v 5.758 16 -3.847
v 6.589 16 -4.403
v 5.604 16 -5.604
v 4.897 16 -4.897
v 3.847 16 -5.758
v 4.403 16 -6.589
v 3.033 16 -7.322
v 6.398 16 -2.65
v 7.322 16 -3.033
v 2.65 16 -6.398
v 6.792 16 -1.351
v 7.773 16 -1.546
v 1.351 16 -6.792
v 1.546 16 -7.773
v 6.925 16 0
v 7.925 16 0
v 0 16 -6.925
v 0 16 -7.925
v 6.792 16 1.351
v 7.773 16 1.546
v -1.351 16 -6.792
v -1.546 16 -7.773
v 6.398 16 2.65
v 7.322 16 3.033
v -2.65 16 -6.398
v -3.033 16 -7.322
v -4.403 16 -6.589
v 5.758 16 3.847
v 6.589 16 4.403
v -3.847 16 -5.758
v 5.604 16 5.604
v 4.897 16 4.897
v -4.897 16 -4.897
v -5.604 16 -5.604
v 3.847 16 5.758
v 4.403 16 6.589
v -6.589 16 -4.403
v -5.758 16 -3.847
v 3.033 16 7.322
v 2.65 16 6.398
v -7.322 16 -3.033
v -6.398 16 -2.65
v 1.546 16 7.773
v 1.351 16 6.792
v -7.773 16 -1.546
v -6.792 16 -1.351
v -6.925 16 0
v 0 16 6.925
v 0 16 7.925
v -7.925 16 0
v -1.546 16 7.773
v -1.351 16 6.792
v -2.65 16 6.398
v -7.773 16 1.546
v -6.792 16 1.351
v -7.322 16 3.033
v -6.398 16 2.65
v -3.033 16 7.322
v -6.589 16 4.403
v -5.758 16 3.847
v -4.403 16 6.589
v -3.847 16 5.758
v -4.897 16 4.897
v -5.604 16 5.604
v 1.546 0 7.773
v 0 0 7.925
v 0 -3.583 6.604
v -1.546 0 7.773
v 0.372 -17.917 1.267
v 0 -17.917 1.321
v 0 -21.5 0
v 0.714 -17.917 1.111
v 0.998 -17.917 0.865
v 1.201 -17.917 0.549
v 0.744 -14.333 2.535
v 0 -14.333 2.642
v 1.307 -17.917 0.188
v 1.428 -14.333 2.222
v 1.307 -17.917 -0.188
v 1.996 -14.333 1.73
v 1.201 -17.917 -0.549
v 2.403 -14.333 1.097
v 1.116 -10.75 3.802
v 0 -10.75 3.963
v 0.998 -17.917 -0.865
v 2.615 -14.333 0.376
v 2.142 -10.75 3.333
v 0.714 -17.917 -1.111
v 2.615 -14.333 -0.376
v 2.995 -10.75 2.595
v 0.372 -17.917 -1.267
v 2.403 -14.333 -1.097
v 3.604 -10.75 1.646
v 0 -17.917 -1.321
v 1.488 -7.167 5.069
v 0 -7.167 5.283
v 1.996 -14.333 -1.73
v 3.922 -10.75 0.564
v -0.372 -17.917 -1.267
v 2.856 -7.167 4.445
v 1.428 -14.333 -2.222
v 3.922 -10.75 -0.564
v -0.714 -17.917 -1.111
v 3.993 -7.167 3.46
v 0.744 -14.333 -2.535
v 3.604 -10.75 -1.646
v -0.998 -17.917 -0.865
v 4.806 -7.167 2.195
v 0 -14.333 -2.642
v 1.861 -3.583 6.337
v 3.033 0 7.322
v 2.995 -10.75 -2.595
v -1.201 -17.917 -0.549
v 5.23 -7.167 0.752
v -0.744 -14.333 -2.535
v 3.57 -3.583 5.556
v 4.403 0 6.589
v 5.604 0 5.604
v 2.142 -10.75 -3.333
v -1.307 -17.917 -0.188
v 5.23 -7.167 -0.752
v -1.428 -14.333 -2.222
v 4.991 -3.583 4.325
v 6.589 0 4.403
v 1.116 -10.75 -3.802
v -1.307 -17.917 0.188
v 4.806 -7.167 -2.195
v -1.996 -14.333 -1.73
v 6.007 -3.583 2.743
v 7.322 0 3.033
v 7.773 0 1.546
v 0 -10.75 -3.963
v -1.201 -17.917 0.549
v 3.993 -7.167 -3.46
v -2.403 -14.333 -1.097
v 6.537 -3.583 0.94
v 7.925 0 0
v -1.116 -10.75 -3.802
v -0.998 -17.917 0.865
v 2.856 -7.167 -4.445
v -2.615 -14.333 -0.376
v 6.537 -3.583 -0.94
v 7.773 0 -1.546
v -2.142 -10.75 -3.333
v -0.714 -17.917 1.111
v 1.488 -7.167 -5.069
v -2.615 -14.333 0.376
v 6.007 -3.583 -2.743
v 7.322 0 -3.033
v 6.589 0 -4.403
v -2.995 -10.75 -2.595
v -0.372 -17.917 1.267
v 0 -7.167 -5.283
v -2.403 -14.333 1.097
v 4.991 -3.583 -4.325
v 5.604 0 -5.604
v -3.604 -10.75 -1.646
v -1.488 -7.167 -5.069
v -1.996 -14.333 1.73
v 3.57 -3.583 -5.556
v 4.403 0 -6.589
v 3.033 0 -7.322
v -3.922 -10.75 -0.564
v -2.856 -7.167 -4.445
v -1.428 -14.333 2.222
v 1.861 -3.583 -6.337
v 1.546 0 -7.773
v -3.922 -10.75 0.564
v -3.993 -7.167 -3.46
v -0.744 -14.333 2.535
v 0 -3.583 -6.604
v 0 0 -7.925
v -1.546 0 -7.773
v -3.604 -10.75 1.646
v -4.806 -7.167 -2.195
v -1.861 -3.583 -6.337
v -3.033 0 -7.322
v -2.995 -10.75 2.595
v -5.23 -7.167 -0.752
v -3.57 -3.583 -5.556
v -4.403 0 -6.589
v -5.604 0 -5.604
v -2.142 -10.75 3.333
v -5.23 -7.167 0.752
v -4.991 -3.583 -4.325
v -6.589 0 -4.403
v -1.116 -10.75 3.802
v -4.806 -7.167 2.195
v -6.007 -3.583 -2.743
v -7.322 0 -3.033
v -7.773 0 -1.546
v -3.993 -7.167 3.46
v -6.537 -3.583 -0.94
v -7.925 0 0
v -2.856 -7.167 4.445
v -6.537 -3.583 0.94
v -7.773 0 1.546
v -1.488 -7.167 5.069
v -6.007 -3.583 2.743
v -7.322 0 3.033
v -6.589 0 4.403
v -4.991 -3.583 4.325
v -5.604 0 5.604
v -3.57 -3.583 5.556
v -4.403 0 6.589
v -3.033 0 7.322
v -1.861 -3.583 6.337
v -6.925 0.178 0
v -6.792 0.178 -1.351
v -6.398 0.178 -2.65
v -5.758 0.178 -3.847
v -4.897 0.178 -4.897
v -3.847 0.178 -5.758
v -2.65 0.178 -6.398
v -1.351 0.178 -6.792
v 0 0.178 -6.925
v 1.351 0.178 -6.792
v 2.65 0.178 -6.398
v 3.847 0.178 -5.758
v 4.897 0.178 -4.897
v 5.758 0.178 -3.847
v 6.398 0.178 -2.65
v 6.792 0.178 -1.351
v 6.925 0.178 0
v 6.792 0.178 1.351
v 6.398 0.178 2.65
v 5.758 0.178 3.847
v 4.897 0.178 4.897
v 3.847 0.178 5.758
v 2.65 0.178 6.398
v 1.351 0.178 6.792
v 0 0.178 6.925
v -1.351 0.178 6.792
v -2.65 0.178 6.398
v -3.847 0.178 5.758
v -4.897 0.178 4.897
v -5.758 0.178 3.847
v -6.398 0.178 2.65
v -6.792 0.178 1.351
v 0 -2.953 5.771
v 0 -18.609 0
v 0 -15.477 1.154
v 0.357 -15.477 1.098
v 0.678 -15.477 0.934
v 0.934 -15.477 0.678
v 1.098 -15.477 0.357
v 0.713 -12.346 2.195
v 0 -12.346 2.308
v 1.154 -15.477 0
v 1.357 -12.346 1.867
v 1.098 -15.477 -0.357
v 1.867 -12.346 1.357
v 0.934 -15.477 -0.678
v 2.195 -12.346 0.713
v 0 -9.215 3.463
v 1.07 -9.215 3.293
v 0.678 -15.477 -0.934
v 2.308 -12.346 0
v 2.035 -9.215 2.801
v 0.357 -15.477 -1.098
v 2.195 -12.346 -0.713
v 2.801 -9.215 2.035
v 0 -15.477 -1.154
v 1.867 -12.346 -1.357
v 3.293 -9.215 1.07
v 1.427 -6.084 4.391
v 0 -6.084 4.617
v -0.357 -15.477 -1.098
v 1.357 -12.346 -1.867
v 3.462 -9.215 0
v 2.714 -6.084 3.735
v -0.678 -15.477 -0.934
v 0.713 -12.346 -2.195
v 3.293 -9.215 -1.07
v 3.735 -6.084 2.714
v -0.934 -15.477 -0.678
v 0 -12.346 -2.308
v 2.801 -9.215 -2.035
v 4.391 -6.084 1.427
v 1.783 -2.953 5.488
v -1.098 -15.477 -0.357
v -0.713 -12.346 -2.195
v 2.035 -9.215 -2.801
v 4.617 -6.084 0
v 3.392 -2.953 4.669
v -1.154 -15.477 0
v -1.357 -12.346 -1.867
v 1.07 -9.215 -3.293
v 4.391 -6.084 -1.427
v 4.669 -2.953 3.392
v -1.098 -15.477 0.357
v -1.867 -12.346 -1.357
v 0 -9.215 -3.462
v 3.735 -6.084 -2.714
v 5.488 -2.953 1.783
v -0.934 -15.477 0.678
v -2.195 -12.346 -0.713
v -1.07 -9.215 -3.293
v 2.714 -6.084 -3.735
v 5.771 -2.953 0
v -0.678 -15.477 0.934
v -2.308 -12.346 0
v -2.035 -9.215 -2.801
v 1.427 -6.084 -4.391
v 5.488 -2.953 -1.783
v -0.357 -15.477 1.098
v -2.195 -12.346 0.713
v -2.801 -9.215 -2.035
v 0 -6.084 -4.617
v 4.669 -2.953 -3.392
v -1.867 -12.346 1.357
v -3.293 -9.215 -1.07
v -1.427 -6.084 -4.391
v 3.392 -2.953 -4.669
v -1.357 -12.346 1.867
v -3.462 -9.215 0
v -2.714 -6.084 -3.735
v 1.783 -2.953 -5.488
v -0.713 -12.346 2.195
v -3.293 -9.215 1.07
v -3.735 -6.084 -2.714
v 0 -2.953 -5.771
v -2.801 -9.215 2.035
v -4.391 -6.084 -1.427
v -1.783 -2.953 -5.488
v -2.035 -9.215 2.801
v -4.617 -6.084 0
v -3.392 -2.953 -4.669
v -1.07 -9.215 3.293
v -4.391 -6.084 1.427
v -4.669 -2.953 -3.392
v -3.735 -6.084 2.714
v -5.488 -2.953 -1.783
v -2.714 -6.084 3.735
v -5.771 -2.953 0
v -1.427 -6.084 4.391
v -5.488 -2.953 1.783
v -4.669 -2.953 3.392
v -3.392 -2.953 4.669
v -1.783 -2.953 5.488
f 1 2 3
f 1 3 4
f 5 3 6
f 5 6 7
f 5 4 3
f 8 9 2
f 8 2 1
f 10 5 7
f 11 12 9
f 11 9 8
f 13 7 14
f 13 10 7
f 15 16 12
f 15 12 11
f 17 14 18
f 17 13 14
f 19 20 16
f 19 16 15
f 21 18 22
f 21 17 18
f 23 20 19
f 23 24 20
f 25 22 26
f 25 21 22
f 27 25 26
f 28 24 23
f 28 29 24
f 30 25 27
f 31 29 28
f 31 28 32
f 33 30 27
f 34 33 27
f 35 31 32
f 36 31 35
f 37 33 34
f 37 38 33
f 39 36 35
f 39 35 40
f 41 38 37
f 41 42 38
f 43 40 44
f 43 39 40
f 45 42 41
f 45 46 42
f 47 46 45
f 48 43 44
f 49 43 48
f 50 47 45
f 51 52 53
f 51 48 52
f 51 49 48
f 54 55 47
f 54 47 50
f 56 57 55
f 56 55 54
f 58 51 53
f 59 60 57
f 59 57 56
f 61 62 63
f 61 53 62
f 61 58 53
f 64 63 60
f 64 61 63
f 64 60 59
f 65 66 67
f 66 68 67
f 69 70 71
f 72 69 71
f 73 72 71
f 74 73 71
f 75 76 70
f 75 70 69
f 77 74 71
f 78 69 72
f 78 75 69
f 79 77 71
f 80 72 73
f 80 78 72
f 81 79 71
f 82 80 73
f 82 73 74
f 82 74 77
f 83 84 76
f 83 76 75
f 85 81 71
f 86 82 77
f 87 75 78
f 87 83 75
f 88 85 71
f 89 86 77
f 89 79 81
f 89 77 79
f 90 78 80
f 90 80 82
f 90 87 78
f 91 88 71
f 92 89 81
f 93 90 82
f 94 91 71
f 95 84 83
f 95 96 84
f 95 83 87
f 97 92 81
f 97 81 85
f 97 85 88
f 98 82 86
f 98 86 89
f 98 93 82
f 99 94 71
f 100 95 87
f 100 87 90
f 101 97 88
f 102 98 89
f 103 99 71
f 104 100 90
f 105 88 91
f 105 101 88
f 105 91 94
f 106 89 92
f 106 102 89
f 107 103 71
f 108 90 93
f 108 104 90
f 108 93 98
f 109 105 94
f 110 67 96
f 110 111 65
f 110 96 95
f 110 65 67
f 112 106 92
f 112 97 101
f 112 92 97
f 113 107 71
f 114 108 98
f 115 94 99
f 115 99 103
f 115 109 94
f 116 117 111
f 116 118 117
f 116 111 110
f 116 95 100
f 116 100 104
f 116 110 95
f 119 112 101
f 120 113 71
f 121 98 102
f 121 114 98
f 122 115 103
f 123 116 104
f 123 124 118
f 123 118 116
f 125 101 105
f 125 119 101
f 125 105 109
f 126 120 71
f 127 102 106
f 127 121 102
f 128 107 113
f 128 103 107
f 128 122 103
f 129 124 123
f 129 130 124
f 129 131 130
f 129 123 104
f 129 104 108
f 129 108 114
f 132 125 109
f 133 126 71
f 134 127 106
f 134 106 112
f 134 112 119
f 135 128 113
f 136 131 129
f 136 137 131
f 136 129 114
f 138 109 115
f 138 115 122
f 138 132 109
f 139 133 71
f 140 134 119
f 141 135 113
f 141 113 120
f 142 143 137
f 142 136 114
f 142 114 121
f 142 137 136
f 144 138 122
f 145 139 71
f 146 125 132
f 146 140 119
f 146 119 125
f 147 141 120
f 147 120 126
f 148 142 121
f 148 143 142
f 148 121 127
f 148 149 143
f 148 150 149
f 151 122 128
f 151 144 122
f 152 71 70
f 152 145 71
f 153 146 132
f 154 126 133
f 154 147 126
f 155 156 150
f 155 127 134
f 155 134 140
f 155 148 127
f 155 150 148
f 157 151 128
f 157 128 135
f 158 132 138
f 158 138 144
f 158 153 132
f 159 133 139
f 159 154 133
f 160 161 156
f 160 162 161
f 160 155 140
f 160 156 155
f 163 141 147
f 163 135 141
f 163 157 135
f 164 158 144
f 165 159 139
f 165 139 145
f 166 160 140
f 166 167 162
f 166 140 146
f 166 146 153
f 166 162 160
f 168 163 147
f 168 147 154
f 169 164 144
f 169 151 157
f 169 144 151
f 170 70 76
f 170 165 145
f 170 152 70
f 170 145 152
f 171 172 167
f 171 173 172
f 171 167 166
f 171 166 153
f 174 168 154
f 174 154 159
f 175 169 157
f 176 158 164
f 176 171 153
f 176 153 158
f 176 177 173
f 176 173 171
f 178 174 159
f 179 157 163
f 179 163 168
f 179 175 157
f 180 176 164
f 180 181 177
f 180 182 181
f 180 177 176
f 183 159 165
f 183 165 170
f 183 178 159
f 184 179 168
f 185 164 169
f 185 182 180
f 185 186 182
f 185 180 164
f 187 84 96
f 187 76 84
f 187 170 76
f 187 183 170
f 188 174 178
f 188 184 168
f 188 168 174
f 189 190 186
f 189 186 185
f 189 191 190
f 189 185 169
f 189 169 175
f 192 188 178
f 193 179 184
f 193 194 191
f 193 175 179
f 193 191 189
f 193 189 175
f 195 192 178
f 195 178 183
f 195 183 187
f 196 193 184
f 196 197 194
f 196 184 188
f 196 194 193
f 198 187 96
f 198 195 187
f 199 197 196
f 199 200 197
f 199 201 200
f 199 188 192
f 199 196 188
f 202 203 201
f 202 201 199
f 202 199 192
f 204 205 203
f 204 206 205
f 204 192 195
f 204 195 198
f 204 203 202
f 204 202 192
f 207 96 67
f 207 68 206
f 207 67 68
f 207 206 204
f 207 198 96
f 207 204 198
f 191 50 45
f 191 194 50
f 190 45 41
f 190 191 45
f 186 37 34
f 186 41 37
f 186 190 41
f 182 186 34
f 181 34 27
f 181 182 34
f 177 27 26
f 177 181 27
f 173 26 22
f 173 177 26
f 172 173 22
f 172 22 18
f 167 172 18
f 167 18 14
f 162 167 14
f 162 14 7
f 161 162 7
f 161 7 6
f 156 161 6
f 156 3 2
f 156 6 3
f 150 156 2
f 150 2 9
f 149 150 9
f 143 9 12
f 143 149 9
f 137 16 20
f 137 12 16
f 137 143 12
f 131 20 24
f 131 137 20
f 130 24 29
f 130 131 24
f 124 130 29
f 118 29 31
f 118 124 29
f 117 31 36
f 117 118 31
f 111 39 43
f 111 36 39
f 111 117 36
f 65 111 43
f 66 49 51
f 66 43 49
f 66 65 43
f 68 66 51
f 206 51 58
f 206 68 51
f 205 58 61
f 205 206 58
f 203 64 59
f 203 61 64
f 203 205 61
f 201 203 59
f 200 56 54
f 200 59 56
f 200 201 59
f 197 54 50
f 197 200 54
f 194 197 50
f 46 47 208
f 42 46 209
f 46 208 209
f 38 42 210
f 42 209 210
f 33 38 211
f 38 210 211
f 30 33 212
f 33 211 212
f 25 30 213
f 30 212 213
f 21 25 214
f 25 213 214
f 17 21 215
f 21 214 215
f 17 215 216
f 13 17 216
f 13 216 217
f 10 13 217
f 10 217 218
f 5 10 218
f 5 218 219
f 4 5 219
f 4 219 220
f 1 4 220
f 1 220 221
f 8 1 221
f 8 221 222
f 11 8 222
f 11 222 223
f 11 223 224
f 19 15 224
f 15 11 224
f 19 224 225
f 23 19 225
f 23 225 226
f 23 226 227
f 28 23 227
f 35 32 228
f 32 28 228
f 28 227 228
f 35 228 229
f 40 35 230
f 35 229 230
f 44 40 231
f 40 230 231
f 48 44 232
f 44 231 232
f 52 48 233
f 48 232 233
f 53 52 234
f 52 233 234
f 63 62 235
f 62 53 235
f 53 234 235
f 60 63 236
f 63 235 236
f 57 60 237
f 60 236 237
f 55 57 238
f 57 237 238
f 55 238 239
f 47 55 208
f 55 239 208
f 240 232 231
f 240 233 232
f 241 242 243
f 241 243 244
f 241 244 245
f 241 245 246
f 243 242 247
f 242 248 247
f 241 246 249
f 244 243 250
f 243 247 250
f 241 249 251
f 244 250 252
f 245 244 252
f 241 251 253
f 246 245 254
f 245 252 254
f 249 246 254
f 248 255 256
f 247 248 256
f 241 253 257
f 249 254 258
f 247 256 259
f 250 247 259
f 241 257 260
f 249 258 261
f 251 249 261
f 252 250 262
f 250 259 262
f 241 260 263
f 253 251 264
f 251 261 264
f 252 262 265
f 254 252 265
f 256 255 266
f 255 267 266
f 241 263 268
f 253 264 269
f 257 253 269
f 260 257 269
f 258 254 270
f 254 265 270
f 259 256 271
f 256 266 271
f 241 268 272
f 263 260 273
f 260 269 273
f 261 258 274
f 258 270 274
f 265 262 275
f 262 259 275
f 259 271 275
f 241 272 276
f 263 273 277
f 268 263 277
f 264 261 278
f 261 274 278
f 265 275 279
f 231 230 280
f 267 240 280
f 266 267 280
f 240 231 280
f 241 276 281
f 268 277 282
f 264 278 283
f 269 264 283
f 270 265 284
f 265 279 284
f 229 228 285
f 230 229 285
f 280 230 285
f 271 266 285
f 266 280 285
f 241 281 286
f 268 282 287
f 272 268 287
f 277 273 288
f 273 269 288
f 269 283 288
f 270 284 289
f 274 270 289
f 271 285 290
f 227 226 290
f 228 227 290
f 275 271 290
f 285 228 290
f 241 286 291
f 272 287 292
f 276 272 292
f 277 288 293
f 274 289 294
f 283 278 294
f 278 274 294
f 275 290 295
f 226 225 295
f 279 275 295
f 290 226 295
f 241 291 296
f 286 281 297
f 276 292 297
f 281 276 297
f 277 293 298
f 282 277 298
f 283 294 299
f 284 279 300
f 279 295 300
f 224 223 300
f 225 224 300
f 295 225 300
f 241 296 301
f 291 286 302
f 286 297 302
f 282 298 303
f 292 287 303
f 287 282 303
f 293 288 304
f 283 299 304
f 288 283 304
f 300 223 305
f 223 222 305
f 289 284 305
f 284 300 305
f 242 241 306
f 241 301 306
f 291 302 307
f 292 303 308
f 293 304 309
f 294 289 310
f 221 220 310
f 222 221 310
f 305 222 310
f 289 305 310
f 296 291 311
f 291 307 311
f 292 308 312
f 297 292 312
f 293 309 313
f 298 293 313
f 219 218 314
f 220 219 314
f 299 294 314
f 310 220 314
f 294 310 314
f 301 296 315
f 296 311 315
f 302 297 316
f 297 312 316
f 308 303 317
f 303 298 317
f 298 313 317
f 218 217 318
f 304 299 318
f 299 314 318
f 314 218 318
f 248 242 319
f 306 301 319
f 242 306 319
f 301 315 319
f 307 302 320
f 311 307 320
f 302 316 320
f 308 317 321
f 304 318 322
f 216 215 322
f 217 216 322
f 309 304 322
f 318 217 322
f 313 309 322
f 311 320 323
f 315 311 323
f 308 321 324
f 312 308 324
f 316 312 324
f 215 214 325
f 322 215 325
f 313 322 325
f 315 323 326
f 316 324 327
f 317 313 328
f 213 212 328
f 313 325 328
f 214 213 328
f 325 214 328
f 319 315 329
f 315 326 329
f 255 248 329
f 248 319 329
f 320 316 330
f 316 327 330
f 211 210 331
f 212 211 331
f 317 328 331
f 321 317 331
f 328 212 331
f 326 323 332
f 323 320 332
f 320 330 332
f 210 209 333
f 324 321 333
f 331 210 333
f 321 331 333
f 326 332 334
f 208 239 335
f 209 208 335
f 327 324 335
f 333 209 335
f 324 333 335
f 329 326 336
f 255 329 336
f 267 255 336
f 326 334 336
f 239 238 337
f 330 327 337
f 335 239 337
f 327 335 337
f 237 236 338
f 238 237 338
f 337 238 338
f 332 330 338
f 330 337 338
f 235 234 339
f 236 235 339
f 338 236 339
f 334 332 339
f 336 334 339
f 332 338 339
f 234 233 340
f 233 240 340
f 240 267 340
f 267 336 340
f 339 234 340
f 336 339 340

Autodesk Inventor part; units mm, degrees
ref_plane "YZ Plane" through (0, 0, 0) normal (1, 0, 0) x (0, 1, 0)
ref_plane "XZ Plane" through (0, 0, 0) normal (0, 1, 0) x (-1, 0, 0)
ref_plane "XY Plane" through (0, 0, 0) normal (0, 0, 1) x (1, 0, 0)
sketch "Sketch1" plane through (0, 0, 0) normal (0, 1, 0) x (-1, 0, 0)
  circle A0 centre (0, 0) radius 7.925
  dimension "d5" = 15.85
extrude "Extrusion1" add sketch "Sketch1" along normal blind 16
sketch "Sketch2" plane through (0, 0, 0) normal (1, 0, 0) x (0, 1, 0)
  line L0 (16, -7.925) -> (16, 7.925) projected
  line L1 (0, 7.925) -> (0, -7.925) projected
  line L2 (0, 7.925) -> (0, -7.925) projected
  line L3 (0, 7.925) -> (-21.5, 0)
  line L4 (-21.5, 0) -> (0, 0)
  line L5 (0, 7.925) -> (0, 0)
  dimension "d2" = 21.5
revolve "Revolution1" add sketch "Sketch2" angle 360 about axis through (0, -21.5, 0) along (0, 1, 0)
shell "Shell1" thickness 1 removed faces 1 at (2.2031, 16, 0.1081)
properties part number "FalconTube15mL"
